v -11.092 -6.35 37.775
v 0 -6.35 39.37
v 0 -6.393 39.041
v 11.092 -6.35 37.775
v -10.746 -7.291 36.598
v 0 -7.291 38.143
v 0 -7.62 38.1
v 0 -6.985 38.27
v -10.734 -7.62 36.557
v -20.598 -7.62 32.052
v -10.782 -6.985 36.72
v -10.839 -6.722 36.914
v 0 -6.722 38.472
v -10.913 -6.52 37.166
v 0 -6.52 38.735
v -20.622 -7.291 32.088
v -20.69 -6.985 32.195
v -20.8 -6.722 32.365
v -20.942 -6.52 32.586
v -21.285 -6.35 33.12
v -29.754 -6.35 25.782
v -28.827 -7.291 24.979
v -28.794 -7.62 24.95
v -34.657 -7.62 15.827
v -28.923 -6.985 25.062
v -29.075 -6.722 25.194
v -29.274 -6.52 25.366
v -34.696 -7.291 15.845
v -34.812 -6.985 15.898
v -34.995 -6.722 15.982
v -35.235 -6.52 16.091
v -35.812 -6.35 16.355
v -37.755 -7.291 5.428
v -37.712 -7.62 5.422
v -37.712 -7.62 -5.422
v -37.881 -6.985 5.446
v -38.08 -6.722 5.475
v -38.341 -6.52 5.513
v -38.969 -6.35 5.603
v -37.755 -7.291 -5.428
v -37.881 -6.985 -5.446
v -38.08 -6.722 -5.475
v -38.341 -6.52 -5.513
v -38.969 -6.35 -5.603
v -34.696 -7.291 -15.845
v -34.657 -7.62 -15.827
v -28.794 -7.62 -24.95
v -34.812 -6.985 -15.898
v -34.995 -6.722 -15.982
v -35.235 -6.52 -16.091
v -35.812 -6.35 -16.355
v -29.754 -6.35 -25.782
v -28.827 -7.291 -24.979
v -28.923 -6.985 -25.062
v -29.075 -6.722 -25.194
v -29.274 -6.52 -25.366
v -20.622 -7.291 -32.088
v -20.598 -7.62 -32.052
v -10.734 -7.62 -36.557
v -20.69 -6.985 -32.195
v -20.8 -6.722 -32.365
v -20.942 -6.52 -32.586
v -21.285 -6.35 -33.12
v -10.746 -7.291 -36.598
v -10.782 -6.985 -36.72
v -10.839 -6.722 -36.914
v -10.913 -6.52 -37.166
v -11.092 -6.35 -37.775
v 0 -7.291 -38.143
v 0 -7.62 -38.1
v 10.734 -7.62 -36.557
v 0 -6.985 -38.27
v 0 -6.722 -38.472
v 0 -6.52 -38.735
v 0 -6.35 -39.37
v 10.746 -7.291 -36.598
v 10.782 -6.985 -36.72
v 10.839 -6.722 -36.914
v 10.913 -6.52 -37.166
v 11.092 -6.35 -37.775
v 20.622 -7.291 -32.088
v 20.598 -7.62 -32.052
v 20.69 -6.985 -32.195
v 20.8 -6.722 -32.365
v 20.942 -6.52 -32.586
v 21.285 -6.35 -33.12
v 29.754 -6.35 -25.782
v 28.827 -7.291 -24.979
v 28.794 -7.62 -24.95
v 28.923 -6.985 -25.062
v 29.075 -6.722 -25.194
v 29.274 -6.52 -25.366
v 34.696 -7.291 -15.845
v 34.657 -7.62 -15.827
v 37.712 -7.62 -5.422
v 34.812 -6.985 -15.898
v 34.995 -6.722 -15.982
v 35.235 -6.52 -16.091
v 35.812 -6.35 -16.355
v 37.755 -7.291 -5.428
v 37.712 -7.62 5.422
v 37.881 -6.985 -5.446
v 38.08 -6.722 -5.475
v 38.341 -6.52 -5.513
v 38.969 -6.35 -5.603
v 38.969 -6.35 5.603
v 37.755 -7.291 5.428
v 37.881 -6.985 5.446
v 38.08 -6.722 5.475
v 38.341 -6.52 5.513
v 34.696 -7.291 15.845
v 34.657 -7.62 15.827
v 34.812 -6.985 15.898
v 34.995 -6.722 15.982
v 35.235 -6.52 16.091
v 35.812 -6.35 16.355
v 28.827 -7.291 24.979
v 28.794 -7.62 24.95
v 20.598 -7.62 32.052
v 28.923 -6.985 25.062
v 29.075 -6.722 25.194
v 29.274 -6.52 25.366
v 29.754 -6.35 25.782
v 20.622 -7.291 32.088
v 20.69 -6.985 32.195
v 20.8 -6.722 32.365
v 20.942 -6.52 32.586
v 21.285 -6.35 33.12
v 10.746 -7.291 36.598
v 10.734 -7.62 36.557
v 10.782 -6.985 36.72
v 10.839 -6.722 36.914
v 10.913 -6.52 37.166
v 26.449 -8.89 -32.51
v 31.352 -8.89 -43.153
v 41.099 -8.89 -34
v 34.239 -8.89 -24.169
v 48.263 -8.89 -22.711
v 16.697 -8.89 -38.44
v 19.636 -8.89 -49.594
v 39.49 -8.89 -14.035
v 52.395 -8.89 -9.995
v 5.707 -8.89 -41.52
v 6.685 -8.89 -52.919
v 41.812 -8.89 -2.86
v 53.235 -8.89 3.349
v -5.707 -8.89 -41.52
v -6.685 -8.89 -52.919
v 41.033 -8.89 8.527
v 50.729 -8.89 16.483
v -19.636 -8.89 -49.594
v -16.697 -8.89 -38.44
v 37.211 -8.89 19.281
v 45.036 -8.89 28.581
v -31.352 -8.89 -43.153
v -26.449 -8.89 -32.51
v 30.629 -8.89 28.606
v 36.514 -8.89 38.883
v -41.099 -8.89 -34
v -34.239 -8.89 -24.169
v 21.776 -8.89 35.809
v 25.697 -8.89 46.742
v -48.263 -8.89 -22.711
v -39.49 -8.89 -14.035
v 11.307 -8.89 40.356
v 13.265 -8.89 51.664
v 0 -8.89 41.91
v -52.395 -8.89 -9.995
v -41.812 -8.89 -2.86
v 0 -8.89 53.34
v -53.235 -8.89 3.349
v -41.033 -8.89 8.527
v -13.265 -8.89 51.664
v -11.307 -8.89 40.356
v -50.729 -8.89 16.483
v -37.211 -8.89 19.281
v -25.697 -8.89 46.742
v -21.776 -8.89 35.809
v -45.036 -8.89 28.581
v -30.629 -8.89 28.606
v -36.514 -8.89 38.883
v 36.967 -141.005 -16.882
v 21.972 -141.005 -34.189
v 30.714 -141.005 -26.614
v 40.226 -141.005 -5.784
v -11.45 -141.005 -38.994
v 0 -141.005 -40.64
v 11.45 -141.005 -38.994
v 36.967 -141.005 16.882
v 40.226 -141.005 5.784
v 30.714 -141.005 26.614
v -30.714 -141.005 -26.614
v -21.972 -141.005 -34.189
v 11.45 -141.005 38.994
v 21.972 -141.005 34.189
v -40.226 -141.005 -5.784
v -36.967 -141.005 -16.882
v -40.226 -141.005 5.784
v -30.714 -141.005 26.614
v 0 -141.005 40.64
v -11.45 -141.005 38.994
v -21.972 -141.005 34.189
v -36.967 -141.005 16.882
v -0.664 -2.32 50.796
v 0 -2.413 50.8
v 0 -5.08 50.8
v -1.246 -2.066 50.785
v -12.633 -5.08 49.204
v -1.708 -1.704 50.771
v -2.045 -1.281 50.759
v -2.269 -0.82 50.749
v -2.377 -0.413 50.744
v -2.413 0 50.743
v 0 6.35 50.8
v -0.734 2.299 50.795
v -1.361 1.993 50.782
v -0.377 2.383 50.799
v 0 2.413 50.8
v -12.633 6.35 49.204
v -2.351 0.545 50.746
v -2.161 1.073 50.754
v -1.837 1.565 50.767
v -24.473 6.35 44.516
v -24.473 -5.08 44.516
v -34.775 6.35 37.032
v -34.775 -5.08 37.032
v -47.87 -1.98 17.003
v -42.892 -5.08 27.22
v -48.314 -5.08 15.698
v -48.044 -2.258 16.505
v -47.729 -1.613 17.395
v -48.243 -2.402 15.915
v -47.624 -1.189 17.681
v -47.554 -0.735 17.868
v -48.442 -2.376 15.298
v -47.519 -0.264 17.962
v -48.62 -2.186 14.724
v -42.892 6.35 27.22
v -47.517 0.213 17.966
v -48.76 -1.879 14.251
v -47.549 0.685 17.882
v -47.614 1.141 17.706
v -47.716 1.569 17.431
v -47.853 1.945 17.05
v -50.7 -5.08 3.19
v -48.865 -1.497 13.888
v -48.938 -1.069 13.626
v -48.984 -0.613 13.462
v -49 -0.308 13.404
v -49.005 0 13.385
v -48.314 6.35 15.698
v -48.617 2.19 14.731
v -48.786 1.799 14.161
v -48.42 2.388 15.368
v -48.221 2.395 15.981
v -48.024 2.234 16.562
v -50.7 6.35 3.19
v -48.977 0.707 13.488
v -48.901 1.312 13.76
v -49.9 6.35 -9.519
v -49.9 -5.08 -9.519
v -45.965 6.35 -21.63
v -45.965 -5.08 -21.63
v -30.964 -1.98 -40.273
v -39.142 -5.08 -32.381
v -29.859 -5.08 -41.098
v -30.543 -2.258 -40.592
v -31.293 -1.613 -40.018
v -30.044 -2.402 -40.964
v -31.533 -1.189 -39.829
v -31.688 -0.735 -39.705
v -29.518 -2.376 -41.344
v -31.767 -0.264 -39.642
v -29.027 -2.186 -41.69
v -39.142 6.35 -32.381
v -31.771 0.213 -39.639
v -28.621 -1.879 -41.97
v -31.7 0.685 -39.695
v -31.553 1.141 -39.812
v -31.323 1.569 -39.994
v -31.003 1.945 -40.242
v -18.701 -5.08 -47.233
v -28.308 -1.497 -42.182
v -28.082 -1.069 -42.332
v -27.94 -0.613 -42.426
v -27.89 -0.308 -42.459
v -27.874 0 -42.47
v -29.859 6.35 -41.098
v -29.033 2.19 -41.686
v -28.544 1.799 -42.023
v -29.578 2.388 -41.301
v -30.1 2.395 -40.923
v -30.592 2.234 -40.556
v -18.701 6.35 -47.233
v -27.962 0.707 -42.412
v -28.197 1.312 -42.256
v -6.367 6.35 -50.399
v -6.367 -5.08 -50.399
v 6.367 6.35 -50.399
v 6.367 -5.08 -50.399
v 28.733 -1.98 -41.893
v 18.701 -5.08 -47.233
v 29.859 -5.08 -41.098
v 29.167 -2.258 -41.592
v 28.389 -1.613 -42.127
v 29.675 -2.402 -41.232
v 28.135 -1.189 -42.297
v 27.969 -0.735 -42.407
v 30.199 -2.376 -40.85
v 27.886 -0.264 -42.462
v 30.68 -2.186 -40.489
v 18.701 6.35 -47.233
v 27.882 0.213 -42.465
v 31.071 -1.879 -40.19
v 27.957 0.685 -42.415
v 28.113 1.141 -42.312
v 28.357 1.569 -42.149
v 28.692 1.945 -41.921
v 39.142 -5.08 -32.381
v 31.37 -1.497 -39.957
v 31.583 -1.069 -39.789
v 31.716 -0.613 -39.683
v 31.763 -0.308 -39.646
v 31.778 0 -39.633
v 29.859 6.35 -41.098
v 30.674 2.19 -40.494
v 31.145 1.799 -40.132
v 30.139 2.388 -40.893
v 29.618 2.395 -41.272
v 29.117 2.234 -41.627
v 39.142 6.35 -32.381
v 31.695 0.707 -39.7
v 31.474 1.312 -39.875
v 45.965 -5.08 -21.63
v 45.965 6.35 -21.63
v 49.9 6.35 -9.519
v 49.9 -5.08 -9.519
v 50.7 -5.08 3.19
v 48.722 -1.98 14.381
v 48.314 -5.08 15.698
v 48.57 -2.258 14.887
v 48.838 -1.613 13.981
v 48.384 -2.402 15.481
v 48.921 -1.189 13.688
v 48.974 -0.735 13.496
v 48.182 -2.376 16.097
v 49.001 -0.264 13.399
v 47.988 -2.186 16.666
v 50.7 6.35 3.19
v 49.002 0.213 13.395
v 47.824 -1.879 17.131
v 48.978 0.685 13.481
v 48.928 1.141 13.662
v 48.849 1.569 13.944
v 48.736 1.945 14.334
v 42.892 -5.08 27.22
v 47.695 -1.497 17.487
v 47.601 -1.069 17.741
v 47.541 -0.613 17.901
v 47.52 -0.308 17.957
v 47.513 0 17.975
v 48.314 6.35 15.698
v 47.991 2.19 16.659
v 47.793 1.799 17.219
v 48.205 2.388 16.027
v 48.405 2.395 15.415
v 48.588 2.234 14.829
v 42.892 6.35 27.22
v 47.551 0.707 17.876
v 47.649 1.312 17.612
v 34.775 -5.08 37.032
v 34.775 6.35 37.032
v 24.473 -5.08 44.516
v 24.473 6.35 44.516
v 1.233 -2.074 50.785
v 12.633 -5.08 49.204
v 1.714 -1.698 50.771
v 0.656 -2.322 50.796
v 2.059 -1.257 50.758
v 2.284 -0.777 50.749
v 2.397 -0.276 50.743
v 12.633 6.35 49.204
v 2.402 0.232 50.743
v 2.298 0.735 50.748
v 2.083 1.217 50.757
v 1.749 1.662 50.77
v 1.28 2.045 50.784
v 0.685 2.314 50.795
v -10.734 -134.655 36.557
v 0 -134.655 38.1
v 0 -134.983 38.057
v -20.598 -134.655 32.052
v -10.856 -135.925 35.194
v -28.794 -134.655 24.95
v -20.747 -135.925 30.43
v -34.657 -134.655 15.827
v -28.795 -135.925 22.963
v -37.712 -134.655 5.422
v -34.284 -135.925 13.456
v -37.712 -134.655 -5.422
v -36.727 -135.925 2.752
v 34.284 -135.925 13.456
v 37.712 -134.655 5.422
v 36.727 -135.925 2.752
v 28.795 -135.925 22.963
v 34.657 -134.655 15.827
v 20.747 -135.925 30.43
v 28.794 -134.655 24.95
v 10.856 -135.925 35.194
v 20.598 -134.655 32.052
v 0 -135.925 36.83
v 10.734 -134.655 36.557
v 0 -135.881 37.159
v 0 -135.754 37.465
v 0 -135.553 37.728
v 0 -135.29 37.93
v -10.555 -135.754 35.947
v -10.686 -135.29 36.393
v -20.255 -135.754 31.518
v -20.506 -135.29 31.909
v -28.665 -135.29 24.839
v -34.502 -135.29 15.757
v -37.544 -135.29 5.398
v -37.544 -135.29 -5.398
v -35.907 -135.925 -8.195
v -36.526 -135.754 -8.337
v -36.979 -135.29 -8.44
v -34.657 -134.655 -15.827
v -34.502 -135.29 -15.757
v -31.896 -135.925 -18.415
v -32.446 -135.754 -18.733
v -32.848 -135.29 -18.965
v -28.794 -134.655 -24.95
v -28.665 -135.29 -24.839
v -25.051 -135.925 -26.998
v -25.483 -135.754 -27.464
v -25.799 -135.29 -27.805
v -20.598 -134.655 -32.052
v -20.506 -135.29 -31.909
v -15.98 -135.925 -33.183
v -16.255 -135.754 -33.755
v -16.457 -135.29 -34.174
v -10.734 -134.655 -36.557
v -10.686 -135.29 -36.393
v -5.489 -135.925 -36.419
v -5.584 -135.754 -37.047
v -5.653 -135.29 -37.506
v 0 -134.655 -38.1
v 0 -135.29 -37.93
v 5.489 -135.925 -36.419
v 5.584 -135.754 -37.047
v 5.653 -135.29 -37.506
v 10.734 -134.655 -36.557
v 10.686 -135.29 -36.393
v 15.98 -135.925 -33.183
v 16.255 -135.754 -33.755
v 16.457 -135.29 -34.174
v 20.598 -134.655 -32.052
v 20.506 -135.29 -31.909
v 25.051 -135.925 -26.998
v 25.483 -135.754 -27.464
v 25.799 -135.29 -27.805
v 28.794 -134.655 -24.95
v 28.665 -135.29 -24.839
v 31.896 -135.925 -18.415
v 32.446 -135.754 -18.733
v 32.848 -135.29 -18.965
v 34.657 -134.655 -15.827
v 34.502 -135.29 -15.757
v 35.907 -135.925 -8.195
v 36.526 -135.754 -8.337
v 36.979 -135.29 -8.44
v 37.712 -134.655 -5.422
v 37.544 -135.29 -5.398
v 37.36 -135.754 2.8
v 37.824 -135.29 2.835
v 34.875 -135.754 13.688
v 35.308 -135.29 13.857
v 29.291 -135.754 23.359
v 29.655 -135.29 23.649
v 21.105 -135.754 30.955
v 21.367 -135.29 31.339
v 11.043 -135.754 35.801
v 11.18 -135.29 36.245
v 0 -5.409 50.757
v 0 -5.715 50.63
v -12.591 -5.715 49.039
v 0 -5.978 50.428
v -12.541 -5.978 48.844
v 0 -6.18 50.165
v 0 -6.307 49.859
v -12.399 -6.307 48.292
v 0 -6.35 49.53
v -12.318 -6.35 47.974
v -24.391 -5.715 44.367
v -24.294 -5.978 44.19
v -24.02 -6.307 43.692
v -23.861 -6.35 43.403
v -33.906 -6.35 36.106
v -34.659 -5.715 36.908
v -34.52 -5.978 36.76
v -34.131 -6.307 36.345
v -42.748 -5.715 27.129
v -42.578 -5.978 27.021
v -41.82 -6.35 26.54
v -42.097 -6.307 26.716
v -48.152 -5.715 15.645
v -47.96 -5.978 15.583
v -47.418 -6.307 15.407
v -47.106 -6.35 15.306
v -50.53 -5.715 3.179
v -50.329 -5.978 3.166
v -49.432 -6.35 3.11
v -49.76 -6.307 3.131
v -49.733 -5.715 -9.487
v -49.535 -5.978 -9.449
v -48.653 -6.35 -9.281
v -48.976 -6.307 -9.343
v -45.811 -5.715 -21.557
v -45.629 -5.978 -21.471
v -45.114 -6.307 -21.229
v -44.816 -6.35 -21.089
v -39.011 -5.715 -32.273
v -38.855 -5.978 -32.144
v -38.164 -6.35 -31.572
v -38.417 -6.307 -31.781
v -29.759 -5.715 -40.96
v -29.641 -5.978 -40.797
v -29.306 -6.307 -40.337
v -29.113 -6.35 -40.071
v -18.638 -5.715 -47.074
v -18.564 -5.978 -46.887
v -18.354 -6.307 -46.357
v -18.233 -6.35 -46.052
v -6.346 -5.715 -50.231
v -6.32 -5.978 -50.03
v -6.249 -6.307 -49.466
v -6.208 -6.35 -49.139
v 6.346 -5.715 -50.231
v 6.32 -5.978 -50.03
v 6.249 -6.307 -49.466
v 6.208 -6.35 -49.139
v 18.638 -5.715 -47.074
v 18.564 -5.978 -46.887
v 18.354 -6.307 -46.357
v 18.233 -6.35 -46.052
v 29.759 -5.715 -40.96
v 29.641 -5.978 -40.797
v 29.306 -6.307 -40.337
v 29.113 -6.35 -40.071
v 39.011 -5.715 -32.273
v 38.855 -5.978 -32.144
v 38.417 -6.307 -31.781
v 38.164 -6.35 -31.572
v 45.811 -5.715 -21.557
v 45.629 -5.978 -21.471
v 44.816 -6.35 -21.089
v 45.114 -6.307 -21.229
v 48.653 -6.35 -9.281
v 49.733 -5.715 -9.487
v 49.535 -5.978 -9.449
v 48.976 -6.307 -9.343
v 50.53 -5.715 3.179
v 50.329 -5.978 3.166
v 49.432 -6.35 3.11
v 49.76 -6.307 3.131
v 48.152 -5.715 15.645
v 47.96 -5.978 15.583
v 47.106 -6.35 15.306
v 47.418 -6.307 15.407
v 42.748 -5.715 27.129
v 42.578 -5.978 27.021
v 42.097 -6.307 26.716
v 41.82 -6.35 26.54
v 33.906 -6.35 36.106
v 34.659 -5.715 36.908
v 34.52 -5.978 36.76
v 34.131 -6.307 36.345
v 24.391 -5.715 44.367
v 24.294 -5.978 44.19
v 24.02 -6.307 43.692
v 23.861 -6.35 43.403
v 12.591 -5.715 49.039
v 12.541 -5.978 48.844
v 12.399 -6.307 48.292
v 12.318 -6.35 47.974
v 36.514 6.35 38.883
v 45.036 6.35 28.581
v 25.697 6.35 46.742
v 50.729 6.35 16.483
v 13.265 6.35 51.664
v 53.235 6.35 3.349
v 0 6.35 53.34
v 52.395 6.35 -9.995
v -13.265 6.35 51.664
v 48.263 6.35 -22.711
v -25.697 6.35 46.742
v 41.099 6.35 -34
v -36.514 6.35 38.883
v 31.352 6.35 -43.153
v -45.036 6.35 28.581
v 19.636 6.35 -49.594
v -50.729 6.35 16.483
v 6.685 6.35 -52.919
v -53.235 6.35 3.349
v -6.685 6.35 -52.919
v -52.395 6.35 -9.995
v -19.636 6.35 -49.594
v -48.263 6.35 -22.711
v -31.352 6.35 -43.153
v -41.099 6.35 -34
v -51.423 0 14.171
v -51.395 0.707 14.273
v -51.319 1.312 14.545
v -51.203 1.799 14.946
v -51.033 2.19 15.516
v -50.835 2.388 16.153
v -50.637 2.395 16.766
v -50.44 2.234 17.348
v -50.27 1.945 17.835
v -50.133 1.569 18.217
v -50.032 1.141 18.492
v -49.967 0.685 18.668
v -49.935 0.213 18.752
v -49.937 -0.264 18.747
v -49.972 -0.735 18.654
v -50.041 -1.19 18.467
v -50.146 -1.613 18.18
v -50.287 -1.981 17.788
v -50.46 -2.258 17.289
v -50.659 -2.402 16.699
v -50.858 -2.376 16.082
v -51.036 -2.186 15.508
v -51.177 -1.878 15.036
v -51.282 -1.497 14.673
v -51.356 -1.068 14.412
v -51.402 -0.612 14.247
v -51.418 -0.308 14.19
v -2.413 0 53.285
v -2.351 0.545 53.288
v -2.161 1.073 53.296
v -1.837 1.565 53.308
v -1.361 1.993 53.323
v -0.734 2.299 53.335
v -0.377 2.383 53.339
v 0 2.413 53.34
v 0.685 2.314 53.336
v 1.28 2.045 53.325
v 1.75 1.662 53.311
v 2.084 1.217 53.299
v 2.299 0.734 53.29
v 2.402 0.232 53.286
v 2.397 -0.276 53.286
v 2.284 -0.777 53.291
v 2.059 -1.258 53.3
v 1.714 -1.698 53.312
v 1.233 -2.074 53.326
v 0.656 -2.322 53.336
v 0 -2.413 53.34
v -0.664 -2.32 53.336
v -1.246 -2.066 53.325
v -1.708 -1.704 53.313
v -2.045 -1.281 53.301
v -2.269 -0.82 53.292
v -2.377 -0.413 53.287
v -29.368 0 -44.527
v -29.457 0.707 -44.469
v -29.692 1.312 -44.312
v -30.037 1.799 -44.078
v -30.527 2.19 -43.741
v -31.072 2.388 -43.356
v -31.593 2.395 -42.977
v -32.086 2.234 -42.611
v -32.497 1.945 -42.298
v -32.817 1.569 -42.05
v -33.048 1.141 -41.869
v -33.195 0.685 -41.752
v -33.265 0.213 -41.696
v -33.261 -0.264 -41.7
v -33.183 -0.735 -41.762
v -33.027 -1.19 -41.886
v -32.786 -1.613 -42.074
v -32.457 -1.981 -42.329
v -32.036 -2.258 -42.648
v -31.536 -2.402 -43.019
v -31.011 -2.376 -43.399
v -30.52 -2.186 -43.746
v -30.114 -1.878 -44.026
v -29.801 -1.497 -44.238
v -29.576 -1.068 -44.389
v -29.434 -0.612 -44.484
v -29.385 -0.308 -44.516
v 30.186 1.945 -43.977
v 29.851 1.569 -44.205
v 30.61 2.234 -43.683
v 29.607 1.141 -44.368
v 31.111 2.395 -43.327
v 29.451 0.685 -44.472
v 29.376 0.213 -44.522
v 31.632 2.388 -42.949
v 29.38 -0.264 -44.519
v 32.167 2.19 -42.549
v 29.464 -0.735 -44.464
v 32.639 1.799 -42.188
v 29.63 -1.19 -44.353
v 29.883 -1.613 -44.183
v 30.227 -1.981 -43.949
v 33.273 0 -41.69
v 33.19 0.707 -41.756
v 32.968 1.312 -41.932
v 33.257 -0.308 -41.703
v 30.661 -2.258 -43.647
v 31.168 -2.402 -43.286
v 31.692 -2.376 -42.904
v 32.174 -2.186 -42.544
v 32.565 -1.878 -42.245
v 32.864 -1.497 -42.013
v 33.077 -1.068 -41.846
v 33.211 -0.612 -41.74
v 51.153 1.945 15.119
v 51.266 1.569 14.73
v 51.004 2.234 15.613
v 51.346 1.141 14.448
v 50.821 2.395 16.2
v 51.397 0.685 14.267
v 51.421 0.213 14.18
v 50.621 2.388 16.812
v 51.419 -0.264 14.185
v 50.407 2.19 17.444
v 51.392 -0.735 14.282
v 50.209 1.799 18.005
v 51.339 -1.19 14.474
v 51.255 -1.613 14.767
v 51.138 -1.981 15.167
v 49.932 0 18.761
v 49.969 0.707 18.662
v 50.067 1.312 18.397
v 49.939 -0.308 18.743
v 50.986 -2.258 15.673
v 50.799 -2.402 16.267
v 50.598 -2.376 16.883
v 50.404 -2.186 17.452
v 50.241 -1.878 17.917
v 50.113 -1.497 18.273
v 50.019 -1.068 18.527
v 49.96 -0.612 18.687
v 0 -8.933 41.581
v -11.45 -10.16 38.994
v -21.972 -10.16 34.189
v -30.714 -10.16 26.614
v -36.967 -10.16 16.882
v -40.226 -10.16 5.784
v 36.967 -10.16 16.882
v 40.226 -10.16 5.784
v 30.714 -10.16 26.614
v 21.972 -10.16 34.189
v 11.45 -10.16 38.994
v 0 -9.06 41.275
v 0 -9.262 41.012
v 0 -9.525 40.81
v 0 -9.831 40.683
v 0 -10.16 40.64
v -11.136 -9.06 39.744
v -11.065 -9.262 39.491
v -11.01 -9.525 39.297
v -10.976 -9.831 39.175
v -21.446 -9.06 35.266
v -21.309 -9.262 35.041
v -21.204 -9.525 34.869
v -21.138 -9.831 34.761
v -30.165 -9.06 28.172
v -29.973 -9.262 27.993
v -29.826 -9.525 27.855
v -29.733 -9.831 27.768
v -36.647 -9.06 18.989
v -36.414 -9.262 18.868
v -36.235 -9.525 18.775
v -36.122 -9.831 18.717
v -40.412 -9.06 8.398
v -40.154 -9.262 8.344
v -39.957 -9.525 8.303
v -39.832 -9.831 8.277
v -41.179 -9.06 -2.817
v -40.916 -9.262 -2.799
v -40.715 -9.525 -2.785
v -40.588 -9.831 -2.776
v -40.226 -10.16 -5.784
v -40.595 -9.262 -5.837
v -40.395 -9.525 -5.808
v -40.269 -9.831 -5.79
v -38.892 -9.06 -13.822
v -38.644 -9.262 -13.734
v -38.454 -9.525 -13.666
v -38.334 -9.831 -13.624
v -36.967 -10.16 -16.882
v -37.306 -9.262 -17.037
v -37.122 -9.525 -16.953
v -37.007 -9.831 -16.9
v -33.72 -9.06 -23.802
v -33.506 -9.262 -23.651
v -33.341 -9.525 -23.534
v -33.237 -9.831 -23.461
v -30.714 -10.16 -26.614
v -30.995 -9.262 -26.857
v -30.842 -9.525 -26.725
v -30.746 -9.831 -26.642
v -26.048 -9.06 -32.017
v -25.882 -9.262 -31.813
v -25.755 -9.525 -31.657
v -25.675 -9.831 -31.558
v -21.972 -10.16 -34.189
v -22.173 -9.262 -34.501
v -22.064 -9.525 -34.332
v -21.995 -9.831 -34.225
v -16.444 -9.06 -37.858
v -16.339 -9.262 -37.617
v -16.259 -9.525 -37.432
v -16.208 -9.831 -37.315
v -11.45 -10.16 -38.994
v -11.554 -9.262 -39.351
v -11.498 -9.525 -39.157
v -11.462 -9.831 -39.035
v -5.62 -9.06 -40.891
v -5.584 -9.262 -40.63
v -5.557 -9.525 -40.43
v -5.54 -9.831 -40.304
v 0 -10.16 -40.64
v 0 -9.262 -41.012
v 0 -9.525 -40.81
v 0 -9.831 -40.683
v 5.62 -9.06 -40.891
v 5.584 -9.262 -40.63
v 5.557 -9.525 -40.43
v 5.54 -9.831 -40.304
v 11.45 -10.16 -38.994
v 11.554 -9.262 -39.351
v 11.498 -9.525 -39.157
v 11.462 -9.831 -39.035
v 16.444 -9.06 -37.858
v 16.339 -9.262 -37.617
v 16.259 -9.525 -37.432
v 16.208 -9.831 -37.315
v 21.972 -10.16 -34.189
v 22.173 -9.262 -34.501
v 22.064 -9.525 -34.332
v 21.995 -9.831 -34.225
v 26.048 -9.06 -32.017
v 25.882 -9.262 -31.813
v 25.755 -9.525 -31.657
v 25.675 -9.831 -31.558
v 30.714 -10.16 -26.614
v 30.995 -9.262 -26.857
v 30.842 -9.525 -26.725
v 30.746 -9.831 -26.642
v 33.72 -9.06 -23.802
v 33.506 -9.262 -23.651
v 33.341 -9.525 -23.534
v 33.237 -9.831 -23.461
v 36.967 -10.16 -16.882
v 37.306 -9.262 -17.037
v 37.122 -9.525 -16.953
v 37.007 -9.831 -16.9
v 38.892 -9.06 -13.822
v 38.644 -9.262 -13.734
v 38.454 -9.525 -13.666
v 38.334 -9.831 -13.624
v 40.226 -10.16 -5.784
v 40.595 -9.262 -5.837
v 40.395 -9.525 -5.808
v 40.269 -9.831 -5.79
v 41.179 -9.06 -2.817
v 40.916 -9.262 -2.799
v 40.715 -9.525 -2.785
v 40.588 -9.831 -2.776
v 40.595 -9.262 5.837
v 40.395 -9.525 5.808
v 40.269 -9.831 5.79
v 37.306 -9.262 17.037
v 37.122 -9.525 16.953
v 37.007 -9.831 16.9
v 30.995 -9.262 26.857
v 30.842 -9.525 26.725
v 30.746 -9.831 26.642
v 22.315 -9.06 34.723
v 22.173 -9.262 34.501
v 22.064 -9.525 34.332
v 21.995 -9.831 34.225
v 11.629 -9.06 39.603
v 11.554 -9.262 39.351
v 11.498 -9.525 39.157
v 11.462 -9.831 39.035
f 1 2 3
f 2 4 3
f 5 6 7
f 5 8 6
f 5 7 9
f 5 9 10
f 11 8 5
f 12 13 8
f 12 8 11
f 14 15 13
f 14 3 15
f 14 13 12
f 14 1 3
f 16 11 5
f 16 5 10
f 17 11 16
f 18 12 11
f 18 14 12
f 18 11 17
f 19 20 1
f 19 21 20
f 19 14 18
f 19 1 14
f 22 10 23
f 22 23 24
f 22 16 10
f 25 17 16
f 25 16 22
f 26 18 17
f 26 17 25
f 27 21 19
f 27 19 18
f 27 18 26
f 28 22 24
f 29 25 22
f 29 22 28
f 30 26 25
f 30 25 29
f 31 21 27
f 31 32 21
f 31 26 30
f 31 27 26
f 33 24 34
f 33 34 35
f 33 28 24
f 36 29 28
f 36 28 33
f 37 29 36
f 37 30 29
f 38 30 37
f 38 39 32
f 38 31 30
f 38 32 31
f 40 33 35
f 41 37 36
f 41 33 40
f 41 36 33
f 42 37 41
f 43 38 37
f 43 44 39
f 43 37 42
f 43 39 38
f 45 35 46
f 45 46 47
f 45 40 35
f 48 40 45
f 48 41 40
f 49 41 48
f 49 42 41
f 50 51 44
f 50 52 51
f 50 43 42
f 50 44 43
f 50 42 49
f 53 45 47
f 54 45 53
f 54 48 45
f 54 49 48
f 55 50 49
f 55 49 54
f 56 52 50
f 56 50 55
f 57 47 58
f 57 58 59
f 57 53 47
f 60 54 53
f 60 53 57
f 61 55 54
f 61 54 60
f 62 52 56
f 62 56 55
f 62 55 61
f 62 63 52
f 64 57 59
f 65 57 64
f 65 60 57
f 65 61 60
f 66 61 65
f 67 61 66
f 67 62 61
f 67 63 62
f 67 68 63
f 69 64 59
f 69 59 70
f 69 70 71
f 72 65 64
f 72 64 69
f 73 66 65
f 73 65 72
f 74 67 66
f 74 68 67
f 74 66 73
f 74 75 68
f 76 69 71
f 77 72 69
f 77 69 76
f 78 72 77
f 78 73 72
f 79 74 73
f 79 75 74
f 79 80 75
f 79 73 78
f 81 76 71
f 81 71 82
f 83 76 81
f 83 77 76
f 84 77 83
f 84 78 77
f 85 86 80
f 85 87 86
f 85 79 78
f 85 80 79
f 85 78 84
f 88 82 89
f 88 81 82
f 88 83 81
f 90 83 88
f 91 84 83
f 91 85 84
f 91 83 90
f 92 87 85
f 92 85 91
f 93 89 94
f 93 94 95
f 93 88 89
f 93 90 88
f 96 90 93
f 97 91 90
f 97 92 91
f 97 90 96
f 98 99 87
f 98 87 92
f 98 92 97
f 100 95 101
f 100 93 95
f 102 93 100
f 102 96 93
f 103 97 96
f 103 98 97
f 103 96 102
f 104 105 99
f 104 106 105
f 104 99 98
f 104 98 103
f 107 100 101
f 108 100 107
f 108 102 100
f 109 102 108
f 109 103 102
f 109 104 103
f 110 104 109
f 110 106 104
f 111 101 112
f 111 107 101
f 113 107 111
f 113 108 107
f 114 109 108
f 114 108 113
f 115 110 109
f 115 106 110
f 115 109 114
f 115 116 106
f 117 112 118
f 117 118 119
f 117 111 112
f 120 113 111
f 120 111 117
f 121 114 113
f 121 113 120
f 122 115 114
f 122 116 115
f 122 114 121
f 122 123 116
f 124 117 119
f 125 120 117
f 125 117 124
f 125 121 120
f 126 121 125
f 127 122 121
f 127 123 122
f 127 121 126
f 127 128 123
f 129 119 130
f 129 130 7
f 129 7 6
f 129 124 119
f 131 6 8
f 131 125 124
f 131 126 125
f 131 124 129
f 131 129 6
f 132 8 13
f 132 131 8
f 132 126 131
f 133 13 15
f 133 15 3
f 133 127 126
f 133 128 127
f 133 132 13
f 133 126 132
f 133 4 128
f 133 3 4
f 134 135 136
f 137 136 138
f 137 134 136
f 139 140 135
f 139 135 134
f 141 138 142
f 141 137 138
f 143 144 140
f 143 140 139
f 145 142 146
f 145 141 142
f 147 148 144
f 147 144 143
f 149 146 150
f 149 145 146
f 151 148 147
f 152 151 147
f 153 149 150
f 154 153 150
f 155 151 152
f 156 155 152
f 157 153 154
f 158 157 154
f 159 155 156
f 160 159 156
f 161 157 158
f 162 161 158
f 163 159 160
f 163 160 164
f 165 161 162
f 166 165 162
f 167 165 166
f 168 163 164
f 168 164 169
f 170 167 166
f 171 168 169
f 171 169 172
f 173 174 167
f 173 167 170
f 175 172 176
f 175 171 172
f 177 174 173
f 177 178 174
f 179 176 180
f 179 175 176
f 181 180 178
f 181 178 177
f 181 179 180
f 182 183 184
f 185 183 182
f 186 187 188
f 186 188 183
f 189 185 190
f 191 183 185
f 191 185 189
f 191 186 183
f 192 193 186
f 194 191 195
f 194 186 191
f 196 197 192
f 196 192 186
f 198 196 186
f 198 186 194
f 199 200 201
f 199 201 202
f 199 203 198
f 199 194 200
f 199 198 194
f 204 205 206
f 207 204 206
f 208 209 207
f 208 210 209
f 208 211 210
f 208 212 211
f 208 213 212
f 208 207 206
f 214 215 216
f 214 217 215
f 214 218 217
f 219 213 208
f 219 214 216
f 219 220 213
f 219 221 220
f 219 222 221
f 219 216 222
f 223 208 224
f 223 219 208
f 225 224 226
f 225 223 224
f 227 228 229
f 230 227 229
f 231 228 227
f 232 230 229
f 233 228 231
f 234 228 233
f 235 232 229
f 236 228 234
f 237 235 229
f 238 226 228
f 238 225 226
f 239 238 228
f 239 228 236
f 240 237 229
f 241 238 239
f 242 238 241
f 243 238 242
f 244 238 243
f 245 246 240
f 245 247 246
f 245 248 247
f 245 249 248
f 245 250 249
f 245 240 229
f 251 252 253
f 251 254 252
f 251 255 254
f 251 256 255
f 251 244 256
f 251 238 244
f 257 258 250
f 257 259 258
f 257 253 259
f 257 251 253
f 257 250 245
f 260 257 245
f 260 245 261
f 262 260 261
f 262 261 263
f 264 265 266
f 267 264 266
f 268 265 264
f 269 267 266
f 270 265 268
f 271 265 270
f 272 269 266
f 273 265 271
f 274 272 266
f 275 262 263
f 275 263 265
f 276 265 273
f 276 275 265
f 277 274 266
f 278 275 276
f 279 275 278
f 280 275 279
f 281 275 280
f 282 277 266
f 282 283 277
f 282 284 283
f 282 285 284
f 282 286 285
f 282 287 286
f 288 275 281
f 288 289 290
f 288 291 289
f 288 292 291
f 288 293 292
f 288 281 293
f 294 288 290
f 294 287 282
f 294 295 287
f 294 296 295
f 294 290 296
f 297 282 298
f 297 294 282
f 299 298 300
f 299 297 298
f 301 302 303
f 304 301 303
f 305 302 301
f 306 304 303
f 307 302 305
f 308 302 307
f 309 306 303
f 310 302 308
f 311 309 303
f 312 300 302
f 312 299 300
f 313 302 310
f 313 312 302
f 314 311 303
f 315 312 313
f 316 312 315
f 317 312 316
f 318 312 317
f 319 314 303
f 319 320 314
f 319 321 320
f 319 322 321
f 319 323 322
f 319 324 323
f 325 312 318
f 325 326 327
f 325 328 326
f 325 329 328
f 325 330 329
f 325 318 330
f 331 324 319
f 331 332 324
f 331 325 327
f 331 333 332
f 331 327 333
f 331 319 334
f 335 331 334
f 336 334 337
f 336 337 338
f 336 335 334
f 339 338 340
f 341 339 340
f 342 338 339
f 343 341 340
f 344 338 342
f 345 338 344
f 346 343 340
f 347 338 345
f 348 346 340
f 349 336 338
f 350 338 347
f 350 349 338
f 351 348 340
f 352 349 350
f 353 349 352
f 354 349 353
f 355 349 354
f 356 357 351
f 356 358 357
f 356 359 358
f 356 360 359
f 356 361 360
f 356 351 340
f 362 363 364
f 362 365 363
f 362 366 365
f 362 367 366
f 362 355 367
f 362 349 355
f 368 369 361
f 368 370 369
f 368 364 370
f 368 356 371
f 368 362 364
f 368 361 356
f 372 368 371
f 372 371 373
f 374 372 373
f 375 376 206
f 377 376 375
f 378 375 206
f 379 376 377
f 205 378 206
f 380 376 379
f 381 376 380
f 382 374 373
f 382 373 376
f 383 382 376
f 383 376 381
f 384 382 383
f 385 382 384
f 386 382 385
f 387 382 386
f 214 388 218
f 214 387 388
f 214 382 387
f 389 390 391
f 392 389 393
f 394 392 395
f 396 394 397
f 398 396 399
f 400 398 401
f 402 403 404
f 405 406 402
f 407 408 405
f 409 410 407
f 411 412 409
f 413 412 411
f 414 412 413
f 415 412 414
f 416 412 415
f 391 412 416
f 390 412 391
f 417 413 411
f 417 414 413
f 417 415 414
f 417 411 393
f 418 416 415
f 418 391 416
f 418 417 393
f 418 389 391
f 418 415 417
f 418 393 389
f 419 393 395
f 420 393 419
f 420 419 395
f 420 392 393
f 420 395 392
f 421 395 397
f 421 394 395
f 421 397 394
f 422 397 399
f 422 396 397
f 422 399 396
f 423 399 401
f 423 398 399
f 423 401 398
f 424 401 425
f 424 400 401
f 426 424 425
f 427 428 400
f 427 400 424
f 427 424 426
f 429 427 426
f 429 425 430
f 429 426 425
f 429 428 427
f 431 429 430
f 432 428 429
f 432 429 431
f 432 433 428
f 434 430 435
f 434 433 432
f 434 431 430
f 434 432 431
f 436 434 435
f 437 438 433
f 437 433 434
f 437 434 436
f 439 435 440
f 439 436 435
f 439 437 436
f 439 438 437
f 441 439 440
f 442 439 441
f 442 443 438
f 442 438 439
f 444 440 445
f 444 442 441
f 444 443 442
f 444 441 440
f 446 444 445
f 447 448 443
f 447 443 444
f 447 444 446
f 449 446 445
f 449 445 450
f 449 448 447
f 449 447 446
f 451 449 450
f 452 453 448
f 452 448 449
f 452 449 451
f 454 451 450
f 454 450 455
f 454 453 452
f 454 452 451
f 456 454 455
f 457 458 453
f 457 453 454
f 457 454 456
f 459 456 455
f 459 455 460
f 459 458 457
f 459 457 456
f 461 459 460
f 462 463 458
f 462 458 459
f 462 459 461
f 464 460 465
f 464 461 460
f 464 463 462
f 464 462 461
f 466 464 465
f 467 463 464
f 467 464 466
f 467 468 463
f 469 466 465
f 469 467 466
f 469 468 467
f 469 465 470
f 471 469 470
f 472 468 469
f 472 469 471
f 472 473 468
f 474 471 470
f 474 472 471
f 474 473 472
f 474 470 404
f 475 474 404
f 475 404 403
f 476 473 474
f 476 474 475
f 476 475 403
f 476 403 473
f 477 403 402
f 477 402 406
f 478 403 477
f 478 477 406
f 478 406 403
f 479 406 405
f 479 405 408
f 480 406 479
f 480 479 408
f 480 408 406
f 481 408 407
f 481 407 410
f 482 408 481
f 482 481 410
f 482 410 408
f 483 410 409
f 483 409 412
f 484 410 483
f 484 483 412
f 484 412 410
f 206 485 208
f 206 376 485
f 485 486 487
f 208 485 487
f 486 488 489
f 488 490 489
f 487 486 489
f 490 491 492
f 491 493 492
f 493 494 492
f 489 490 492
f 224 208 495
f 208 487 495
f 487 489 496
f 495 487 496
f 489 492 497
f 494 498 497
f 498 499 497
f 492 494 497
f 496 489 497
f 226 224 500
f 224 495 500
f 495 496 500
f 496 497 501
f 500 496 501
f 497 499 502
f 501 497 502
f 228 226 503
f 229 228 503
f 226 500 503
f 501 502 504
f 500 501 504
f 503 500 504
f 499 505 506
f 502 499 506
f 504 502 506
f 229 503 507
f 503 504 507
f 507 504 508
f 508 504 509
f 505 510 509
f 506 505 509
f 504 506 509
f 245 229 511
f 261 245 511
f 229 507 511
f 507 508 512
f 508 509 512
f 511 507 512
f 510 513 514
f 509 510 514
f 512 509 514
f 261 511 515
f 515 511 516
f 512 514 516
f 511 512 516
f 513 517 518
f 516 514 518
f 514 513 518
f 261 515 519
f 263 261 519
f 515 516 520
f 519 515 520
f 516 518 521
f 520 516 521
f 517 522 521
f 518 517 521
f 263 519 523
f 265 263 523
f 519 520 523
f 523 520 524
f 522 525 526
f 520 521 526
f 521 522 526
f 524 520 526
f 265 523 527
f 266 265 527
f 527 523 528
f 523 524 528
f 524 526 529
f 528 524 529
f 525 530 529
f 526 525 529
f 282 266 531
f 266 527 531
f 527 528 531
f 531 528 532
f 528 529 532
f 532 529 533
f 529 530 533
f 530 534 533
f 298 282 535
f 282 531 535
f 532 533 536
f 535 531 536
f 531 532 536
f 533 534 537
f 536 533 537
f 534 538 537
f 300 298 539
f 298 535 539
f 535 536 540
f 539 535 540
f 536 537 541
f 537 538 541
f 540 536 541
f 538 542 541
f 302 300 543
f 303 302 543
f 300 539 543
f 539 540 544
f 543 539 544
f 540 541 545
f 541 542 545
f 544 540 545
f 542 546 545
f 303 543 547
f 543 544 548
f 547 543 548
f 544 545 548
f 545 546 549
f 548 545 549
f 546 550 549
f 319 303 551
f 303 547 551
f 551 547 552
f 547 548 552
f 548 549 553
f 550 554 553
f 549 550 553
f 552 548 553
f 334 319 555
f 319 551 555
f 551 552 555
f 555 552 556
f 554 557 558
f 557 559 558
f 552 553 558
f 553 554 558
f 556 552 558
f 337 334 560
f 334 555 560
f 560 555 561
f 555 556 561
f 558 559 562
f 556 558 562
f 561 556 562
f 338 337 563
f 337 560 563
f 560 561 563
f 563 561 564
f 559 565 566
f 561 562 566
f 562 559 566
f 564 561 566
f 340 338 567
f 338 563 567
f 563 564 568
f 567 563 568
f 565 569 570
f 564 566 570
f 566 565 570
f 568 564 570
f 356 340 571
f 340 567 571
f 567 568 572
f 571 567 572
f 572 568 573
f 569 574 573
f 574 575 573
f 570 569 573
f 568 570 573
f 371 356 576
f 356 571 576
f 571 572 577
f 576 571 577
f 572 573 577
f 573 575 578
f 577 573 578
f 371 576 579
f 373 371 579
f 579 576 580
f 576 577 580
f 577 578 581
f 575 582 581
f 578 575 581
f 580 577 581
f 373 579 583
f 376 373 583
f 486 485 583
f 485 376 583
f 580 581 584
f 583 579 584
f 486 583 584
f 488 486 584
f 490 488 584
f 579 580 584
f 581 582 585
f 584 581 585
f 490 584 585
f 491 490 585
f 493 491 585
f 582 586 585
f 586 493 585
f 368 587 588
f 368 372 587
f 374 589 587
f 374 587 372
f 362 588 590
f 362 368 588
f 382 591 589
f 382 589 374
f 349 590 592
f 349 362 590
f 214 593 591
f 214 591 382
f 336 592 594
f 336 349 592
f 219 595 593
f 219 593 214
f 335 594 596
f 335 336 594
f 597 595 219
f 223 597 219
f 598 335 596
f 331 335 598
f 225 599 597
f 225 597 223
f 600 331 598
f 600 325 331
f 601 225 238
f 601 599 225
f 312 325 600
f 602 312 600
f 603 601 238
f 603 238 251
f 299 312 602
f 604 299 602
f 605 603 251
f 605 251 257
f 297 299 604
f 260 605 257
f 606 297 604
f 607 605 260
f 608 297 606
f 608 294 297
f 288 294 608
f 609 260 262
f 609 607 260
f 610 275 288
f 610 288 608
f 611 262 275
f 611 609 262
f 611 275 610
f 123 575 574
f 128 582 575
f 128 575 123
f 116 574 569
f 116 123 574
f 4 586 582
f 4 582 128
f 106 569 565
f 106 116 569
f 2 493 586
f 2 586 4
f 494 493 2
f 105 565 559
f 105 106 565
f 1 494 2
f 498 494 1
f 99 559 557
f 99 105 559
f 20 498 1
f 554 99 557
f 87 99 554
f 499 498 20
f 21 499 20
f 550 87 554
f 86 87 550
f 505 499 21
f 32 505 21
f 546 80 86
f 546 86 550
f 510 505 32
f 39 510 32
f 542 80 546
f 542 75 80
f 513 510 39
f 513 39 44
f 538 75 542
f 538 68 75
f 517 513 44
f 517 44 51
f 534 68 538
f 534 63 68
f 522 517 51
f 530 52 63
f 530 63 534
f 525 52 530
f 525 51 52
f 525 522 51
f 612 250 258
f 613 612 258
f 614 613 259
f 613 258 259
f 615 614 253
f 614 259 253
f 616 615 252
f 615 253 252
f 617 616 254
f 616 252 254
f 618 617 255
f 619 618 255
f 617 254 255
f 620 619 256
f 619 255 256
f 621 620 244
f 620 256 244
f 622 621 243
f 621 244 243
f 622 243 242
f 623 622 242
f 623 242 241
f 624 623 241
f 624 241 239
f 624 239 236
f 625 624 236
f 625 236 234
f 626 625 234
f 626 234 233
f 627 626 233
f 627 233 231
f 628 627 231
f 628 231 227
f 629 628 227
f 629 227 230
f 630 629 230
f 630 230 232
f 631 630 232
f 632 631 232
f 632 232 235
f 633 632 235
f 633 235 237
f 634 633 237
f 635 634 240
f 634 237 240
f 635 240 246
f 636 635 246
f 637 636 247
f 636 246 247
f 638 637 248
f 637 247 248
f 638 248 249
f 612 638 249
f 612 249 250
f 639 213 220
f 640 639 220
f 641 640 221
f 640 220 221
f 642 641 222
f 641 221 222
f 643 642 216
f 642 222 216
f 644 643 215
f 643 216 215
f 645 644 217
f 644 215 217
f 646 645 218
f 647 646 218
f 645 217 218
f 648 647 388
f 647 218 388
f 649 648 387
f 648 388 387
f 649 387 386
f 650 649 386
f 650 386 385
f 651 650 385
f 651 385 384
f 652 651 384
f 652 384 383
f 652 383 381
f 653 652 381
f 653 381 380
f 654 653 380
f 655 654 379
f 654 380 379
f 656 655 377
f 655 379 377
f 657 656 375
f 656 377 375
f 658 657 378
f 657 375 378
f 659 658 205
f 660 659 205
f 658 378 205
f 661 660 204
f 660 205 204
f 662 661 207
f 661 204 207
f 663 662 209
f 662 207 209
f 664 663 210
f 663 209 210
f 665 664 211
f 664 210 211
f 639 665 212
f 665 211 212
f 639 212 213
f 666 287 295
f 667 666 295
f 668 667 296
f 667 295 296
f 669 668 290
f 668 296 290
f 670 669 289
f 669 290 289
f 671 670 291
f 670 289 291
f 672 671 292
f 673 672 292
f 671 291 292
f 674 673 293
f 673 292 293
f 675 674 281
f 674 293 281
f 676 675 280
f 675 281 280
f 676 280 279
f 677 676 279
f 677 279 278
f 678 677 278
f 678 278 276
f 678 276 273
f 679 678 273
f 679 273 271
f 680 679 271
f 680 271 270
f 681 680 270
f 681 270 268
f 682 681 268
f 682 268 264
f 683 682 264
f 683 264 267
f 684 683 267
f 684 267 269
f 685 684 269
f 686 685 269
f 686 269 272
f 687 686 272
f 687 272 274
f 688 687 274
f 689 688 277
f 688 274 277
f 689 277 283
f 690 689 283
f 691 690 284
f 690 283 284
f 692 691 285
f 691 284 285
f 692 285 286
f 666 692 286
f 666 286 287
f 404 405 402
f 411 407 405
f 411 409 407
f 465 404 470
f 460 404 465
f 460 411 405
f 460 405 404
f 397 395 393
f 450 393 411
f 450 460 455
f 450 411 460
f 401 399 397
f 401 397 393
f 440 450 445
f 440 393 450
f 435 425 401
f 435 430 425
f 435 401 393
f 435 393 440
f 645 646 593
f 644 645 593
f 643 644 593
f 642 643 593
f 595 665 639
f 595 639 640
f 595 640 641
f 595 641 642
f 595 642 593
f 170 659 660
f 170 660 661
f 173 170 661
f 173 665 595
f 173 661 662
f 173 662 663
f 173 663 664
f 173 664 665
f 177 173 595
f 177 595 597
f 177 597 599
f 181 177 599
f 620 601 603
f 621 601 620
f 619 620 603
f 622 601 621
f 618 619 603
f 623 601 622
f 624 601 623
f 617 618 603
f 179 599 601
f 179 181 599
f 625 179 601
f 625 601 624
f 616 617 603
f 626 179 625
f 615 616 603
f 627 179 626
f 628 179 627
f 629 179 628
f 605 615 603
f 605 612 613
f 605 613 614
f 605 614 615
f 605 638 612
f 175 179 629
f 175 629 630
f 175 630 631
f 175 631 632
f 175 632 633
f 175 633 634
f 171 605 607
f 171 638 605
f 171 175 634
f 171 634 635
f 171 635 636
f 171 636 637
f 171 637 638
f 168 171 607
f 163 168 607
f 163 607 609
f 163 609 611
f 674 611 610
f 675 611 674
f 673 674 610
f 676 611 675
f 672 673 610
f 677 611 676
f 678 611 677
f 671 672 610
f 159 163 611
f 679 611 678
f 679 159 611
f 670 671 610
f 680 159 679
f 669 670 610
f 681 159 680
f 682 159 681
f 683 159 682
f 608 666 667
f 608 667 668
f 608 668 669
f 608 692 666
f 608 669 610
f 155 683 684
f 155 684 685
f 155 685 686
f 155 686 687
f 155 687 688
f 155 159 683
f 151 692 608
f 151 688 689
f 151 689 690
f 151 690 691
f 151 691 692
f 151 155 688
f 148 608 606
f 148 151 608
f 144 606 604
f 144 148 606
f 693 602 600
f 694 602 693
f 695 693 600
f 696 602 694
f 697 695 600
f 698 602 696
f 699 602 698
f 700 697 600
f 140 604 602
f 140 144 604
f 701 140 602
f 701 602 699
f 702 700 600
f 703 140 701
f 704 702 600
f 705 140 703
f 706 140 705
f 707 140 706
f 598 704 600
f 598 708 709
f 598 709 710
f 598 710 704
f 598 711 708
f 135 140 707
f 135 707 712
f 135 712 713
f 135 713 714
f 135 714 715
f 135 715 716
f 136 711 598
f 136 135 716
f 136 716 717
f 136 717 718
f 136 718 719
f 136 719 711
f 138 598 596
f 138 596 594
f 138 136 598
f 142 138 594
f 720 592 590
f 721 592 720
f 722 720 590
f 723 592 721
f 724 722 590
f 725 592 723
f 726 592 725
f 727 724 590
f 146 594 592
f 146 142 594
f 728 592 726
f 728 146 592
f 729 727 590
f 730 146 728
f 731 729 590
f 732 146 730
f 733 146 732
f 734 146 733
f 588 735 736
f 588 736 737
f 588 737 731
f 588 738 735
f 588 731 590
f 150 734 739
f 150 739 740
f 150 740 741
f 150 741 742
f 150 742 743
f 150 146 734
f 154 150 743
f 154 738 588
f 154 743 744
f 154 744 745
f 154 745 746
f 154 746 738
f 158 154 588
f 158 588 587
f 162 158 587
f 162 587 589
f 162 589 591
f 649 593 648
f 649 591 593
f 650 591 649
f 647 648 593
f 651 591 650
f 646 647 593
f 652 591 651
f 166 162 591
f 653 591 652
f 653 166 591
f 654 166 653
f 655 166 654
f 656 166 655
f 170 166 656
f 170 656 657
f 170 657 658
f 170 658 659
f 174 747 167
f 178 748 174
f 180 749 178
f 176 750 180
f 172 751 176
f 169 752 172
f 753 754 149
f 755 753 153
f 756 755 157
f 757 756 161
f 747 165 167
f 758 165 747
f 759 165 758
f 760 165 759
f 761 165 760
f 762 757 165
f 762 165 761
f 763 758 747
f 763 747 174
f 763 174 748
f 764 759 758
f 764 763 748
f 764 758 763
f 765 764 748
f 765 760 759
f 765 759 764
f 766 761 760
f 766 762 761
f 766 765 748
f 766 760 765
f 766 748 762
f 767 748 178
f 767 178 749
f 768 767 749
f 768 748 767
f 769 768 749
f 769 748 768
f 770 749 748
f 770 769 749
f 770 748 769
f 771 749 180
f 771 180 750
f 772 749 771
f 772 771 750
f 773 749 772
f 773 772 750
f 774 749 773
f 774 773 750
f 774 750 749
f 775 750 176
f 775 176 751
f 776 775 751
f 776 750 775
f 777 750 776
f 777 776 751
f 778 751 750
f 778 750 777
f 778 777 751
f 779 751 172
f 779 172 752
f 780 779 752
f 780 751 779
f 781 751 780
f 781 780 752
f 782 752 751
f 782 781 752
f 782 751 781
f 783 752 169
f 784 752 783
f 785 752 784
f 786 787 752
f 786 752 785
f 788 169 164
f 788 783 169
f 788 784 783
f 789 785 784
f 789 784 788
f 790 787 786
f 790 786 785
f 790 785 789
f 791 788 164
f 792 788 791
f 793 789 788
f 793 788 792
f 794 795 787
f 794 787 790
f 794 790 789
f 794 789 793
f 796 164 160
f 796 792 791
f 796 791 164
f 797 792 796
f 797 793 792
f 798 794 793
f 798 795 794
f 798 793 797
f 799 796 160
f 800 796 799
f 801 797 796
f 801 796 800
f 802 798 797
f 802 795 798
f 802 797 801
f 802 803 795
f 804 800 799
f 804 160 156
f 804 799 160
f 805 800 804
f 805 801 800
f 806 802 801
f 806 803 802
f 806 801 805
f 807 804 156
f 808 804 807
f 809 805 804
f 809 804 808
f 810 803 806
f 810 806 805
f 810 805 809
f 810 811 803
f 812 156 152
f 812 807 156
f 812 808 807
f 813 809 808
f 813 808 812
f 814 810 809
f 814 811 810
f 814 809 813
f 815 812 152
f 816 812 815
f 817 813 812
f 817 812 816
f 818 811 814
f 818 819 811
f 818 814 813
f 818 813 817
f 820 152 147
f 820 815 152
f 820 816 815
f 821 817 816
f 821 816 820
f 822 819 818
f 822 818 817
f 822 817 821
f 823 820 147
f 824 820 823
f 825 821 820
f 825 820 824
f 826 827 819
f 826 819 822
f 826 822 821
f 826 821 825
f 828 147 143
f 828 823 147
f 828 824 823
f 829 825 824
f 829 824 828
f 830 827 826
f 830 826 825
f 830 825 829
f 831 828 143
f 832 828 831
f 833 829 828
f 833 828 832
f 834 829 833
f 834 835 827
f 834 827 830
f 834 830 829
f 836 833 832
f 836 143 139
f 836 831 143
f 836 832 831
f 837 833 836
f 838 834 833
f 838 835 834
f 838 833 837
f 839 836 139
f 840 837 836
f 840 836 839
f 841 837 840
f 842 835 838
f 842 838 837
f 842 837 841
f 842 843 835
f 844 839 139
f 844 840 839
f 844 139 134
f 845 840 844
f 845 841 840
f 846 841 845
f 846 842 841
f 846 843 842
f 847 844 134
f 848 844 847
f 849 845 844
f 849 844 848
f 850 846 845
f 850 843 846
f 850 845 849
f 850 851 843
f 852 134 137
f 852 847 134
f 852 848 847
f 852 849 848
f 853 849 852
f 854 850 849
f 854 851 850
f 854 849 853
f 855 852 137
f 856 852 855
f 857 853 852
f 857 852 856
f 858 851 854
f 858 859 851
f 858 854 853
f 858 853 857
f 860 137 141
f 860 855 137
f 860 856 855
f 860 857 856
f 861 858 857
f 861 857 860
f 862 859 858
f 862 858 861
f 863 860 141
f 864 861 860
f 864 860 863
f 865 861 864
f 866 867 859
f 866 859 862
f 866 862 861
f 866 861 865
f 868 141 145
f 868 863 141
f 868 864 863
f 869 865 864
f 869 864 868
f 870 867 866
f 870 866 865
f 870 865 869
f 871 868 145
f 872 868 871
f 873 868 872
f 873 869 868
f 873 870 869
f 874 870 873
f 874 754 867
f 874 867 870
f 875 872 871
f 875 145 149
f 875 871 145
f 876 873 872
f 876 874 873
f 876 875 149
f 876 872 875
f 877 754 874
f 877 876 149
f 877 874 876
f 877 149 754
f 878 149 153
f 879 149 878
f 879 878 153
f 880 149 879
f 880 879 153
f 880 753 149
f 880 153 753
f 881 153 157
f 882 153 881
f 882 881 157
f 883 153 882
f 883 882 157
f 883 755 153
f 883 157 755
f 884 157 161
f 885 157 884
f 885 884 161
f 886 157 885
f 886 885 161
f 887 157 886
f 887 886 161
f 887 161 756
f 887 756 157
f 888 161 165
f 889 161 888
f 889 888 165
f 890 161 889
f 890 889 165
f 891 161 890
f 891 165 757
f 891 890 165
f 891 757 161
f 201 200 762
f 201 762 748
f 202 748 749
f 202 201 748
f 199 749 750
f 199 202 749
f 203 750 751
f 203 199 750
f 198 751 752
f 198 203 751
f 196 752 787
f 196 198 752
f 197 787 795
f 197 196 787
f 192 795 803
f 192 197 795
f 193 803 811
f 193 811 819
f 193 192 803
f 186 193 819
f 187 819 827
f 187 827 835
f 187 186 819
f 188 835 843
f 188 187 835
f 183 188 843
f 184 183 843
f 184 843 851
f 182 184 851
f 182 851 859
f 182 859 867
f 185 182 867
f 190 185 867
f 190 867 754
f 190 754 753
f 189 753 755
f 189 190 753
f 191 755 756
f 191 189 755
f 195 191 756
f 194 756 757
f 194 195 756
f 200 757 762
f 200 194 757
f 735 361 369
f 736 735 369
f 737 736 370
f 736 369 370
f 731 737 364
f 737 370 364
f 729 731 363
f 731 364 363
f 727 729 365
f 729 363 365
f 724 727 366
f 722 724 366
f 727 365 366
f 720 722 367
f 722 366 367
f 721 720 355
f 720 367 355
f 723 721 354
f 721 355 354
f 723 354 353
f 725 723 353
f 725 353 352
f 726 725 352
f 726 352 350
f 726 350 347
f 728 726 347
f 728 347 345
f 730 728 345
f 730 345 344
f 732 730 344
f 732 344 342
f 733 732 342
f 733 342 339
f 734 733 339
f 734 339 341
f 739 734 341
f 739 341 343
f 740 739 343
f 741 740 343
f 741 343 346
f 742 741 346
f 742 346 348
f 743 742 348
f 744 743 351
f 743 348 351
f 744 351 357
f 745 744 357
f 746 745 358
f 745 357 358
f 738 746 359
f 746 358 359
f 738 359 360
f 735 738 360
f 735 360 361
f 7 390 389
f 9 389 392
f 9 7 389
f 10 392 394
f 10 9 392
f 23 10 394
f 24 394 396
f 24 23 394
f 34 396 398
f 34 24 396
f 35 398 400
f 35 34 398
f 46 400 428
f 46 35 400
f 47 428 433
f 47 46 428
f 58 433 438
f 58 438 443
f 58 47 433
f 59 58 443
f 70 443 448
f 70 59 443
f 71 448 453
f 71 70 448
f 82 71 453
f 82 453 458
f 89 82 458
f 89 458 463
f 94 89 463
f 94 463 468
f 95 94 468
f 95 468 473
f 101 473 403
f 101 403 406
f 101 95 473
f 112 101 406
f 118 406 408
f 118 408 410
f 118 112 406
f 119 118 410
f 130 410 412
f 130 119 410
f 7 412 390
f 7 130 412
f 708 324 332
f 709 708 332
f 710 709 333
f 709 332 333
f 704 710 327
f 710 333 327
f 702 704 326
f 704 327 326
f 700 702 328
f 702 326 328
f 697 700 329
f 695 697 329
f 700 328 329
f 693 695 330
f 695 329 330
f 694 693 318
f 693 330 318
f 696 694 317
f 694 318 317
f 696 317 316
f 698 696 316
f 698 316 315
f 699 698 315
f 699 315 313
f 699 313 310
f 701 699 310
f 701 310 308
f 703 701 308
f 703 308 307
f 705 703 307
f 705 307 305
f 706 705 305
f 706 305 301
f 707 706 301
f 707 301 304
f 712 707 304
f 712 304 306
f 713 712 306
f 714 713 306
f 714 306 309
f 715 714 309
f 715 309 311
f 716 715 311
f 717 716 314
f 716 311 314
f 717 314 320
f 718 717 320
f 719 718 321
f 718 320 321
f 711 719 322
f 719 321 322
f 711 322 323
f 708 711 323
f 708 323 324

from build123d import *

# Parameters (mm, degrees)
F2_R            = 1.27
F5_D            = 4.826
F5_DEPTH        = 7.62
F5_START        = 0.0546078
F5_TIP          = 1.4498766737
F5_COPIES_COUNT = 5


# Not quite as in the source:
# - a pattern or mirror of a feature is missing from the dataset's text; its kind, count and spacing are read off the source's solid


with BuildPart() as f1:
    # F0 (on Right) → F1 (revolve)
    with BuildSketch(Plane.YZ):
        Polygon((-6.35, 50.8), (6.35, 50.8), (6.35, 53.34), (-8.89, 53.34), (-8.89, 40.64), (-135.9245181084, 40.64), (-141.0045181084, 40.64), (-141.0045181084, 0), (-135.9245181084, 0), (-135.9245181084, 38.1), (-6.35, 38.1), align=None)
    revolve(axis=Axis((0, -59.97428298, 0), (0, -1, 0)))

    # F2
    f2_edges = [f1.edges().sort_by_distance(p)[0] for p in [
        (0, -6.35, -38.1),
        (0, -6.35, -50.8),
        (0, -8.89, -40.64),
        (0, -135.924518, -38.1),
    ]]
    fillet(f2_edges, radius=F2_R)

    # F5
    # its depths count from where the whole tool has entered the part; down to there all is cleared
    with Locations(Plane.XY.offset(53.34).offset(-F5_START)):
        with Locations((0, 0)):
            f5 = Hole(F5_D / 2, depth=F5_DEPTH)
            with Locations((0, 0, -(F5_DEPTH + F5_TIP / 2))):  # 118° drill point
                Cone(0, F5_D / 2, F5_TIP, mode=Mode.SUBTRACT)

    # F5_copies: F5 ×5 about axis
    f5_copies_axis = Axis((0, 0, 0), (0, 1, 0))
    for i in range(1, F5_COPIES_COUNT):
        add(f5.rotate(f5_copies_axis, i * 360 / F5_COPIES_COUNT), mode=Mode.SUBTRACT)


solid = f1.part
